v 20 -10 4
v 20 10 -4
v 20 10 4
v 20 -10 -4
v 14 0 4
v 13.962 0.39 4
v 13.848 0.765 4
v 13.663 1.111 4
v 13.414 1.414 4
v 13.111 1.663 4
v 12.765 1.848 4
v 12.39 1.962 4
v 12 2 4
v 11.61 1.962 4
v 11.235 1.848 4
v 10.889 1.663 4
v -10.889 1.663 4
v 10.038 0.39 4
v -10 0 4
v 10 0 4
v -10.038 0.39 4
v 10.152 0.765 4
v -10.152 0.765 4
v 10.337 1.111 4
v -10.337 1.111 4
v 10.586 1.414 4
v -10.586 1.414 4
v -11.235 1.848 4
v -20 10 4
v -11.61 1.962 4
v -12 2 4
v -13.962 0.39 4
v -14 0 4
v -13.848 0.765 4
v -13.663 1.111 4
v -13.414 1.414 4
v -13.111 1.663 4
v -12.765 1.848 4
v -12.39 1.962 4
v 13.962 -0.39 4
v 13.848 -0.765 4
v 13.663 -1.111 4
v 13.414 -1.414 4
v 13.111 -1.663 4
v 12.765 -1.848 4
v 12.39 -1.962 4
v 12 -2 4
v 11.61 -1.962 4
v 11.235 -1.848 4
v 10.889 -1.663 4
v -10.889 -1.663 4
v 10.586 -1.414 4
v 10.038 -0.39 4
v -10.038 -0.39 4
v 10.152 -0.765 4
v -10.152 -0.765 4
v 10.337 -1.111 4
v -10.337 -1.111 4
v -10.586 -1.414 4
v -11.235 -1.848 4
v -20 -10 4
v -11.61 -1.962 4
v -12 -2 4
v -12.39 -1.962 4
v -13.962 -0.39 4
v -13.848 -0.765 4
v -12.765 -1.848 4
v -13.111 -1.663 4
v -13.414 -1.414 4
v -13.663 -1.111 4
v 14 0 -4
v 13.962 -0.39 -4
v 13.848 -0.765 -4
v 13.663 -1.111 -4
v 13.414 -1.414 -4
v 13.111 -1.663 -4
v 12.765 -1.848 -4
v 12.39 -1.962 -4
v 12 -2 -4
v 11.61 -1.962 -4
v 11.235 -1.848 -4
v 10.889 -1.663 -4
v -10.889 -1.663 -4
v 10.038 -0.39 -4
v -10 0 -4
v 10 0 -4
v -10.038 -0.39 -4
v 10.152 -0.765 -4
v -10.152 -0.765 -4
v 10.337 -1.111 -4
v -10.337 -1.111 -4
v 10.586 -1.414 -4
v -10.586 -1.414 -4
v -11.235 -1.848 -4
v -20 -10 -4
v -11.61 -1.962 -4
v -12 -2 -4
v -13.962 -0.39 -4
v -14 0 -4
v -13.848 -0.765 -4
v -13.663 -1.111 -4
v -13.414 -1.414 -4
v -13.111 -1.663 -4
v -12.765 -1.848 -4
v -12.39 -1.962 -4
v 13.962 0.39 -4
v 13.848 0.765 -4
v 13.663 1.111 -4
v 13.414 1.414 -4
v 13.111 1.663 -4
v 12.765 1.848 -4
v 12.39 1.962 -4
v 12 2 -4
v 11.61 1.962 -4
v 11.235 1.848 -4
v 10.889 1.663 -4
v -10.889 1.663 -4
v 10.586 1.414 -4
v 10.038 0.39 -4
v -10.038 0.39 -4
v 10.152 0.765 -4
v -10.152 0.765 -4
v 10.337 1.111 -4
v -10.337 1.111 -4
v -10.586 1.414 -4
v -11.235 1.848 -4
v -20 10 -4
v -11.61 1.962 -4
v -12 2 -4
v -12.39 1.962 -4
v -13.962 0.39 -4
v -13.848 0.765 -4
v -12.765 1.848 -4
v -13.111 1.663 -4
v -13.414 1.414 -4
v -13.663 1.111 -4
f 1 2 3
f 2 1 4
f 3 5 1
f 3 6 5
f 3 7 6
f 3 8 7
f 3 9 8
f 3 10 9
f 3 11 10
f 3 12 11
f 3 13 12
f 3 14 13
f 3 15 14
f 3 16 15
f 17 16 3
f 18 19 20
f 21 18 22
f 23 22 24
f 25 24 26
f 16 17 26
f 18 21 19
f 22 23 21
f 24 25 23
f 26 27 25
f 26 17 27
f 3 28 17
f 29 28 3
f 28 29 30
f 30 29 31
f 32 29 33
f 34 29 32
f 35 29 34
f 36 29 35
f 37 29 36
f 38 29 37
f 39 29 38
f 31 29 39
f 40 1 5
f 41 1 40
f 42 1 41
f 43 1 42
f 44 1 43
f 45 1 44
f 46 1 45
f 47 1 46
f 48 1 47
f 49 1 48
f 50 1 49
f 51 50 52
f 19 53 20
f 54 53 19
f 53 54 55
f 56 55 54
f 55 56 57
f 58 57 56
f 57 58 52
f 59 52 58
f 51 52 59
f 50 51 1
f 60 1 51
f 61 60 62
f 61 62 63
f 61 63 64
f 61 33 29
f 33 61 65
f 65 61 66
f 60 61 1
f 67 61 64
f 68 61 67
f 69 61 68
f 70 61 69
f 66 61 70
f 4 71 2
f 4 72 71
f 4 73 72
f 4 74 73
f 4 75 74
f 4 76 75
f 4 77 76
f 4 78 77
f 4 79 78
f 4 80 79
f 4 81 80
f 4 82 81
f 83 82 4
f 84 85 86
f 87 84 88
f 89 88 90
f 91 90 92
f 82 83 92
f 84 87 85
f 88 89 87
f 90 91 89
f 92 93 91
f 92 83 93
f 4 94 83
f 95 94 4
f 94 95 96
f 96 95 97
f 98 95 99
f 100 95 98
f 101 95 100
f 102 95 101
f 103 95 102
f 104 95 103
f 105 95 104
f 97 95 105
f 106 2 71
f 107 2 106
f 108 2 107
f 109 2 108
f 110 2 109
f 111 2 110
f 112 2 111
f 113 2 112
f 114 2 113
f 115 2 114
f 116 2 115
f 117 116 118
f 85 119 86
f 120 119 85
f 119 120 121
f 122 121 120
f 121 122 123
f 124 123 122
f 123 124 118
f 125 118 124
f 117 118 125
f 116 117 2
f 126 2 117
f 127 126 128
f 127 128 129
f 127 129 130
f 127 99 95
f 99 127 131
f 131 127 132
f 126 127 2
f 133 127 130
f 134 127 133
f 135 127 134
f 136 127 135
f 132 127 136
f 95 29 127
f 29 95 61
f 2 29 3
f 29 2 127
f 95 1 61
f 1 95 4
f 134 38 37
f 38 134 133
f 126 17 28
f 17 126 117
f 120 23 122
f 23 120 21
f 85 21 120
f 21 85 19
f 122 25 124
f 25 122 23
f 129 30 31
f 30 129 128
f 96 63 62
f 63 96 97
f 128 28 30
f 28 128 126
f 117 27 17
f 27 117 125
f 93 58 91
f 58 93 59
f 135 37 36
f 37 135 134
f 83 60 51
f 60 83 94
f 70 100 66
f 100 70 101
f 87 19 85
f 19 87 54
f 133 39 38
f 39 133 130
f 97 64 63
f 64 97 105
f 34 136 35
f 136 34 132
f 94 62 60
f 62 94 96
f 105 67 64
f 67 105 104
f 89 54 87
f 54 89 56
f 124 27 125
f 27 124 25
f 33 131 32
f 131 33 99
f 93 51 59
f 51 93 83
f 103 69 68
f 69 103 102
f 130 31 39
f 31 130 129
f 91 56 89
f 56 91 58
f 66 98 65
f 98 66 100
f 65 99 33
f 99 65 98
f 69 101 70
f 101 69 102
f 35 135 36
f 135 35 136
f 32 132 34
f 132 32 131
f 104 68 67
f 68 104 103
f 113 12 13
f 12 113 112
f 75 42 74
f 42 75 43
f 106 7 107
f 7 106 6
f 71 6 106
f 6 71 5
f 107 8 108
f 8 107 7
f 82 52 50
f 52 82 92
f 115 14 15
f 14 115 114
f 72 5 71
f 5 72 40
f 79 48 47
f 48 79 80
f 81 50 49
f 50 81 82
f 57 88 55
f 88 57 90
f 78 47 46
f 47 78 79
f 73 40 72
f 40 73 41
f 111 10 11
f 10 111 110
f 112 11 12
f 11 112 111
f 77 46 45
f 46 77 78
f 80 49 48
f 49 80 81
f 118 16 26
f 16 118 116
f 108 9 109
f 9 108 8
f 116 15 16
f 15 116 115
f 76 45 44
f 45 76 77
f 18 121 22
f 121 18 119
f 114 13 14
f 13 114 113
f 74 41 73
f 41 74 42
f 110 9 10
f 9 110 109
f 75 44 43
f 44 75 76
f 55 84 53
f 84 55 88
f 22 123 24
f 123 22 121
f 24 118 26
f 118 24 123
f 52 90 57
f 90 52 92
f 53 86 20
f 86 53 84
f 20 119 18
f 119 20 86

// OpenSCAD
// Deterministic OpenSCAD smoke artifact for representation experiments.
$fn = 32;
difference() {
  cube([40, 20, 8], center=true);
  translate([-12, 0, 0]) cylinder(h=10, d=4, center=true);
  translate([12, 0, 0]) cylinder(h=10, d=4, center=true);
}
